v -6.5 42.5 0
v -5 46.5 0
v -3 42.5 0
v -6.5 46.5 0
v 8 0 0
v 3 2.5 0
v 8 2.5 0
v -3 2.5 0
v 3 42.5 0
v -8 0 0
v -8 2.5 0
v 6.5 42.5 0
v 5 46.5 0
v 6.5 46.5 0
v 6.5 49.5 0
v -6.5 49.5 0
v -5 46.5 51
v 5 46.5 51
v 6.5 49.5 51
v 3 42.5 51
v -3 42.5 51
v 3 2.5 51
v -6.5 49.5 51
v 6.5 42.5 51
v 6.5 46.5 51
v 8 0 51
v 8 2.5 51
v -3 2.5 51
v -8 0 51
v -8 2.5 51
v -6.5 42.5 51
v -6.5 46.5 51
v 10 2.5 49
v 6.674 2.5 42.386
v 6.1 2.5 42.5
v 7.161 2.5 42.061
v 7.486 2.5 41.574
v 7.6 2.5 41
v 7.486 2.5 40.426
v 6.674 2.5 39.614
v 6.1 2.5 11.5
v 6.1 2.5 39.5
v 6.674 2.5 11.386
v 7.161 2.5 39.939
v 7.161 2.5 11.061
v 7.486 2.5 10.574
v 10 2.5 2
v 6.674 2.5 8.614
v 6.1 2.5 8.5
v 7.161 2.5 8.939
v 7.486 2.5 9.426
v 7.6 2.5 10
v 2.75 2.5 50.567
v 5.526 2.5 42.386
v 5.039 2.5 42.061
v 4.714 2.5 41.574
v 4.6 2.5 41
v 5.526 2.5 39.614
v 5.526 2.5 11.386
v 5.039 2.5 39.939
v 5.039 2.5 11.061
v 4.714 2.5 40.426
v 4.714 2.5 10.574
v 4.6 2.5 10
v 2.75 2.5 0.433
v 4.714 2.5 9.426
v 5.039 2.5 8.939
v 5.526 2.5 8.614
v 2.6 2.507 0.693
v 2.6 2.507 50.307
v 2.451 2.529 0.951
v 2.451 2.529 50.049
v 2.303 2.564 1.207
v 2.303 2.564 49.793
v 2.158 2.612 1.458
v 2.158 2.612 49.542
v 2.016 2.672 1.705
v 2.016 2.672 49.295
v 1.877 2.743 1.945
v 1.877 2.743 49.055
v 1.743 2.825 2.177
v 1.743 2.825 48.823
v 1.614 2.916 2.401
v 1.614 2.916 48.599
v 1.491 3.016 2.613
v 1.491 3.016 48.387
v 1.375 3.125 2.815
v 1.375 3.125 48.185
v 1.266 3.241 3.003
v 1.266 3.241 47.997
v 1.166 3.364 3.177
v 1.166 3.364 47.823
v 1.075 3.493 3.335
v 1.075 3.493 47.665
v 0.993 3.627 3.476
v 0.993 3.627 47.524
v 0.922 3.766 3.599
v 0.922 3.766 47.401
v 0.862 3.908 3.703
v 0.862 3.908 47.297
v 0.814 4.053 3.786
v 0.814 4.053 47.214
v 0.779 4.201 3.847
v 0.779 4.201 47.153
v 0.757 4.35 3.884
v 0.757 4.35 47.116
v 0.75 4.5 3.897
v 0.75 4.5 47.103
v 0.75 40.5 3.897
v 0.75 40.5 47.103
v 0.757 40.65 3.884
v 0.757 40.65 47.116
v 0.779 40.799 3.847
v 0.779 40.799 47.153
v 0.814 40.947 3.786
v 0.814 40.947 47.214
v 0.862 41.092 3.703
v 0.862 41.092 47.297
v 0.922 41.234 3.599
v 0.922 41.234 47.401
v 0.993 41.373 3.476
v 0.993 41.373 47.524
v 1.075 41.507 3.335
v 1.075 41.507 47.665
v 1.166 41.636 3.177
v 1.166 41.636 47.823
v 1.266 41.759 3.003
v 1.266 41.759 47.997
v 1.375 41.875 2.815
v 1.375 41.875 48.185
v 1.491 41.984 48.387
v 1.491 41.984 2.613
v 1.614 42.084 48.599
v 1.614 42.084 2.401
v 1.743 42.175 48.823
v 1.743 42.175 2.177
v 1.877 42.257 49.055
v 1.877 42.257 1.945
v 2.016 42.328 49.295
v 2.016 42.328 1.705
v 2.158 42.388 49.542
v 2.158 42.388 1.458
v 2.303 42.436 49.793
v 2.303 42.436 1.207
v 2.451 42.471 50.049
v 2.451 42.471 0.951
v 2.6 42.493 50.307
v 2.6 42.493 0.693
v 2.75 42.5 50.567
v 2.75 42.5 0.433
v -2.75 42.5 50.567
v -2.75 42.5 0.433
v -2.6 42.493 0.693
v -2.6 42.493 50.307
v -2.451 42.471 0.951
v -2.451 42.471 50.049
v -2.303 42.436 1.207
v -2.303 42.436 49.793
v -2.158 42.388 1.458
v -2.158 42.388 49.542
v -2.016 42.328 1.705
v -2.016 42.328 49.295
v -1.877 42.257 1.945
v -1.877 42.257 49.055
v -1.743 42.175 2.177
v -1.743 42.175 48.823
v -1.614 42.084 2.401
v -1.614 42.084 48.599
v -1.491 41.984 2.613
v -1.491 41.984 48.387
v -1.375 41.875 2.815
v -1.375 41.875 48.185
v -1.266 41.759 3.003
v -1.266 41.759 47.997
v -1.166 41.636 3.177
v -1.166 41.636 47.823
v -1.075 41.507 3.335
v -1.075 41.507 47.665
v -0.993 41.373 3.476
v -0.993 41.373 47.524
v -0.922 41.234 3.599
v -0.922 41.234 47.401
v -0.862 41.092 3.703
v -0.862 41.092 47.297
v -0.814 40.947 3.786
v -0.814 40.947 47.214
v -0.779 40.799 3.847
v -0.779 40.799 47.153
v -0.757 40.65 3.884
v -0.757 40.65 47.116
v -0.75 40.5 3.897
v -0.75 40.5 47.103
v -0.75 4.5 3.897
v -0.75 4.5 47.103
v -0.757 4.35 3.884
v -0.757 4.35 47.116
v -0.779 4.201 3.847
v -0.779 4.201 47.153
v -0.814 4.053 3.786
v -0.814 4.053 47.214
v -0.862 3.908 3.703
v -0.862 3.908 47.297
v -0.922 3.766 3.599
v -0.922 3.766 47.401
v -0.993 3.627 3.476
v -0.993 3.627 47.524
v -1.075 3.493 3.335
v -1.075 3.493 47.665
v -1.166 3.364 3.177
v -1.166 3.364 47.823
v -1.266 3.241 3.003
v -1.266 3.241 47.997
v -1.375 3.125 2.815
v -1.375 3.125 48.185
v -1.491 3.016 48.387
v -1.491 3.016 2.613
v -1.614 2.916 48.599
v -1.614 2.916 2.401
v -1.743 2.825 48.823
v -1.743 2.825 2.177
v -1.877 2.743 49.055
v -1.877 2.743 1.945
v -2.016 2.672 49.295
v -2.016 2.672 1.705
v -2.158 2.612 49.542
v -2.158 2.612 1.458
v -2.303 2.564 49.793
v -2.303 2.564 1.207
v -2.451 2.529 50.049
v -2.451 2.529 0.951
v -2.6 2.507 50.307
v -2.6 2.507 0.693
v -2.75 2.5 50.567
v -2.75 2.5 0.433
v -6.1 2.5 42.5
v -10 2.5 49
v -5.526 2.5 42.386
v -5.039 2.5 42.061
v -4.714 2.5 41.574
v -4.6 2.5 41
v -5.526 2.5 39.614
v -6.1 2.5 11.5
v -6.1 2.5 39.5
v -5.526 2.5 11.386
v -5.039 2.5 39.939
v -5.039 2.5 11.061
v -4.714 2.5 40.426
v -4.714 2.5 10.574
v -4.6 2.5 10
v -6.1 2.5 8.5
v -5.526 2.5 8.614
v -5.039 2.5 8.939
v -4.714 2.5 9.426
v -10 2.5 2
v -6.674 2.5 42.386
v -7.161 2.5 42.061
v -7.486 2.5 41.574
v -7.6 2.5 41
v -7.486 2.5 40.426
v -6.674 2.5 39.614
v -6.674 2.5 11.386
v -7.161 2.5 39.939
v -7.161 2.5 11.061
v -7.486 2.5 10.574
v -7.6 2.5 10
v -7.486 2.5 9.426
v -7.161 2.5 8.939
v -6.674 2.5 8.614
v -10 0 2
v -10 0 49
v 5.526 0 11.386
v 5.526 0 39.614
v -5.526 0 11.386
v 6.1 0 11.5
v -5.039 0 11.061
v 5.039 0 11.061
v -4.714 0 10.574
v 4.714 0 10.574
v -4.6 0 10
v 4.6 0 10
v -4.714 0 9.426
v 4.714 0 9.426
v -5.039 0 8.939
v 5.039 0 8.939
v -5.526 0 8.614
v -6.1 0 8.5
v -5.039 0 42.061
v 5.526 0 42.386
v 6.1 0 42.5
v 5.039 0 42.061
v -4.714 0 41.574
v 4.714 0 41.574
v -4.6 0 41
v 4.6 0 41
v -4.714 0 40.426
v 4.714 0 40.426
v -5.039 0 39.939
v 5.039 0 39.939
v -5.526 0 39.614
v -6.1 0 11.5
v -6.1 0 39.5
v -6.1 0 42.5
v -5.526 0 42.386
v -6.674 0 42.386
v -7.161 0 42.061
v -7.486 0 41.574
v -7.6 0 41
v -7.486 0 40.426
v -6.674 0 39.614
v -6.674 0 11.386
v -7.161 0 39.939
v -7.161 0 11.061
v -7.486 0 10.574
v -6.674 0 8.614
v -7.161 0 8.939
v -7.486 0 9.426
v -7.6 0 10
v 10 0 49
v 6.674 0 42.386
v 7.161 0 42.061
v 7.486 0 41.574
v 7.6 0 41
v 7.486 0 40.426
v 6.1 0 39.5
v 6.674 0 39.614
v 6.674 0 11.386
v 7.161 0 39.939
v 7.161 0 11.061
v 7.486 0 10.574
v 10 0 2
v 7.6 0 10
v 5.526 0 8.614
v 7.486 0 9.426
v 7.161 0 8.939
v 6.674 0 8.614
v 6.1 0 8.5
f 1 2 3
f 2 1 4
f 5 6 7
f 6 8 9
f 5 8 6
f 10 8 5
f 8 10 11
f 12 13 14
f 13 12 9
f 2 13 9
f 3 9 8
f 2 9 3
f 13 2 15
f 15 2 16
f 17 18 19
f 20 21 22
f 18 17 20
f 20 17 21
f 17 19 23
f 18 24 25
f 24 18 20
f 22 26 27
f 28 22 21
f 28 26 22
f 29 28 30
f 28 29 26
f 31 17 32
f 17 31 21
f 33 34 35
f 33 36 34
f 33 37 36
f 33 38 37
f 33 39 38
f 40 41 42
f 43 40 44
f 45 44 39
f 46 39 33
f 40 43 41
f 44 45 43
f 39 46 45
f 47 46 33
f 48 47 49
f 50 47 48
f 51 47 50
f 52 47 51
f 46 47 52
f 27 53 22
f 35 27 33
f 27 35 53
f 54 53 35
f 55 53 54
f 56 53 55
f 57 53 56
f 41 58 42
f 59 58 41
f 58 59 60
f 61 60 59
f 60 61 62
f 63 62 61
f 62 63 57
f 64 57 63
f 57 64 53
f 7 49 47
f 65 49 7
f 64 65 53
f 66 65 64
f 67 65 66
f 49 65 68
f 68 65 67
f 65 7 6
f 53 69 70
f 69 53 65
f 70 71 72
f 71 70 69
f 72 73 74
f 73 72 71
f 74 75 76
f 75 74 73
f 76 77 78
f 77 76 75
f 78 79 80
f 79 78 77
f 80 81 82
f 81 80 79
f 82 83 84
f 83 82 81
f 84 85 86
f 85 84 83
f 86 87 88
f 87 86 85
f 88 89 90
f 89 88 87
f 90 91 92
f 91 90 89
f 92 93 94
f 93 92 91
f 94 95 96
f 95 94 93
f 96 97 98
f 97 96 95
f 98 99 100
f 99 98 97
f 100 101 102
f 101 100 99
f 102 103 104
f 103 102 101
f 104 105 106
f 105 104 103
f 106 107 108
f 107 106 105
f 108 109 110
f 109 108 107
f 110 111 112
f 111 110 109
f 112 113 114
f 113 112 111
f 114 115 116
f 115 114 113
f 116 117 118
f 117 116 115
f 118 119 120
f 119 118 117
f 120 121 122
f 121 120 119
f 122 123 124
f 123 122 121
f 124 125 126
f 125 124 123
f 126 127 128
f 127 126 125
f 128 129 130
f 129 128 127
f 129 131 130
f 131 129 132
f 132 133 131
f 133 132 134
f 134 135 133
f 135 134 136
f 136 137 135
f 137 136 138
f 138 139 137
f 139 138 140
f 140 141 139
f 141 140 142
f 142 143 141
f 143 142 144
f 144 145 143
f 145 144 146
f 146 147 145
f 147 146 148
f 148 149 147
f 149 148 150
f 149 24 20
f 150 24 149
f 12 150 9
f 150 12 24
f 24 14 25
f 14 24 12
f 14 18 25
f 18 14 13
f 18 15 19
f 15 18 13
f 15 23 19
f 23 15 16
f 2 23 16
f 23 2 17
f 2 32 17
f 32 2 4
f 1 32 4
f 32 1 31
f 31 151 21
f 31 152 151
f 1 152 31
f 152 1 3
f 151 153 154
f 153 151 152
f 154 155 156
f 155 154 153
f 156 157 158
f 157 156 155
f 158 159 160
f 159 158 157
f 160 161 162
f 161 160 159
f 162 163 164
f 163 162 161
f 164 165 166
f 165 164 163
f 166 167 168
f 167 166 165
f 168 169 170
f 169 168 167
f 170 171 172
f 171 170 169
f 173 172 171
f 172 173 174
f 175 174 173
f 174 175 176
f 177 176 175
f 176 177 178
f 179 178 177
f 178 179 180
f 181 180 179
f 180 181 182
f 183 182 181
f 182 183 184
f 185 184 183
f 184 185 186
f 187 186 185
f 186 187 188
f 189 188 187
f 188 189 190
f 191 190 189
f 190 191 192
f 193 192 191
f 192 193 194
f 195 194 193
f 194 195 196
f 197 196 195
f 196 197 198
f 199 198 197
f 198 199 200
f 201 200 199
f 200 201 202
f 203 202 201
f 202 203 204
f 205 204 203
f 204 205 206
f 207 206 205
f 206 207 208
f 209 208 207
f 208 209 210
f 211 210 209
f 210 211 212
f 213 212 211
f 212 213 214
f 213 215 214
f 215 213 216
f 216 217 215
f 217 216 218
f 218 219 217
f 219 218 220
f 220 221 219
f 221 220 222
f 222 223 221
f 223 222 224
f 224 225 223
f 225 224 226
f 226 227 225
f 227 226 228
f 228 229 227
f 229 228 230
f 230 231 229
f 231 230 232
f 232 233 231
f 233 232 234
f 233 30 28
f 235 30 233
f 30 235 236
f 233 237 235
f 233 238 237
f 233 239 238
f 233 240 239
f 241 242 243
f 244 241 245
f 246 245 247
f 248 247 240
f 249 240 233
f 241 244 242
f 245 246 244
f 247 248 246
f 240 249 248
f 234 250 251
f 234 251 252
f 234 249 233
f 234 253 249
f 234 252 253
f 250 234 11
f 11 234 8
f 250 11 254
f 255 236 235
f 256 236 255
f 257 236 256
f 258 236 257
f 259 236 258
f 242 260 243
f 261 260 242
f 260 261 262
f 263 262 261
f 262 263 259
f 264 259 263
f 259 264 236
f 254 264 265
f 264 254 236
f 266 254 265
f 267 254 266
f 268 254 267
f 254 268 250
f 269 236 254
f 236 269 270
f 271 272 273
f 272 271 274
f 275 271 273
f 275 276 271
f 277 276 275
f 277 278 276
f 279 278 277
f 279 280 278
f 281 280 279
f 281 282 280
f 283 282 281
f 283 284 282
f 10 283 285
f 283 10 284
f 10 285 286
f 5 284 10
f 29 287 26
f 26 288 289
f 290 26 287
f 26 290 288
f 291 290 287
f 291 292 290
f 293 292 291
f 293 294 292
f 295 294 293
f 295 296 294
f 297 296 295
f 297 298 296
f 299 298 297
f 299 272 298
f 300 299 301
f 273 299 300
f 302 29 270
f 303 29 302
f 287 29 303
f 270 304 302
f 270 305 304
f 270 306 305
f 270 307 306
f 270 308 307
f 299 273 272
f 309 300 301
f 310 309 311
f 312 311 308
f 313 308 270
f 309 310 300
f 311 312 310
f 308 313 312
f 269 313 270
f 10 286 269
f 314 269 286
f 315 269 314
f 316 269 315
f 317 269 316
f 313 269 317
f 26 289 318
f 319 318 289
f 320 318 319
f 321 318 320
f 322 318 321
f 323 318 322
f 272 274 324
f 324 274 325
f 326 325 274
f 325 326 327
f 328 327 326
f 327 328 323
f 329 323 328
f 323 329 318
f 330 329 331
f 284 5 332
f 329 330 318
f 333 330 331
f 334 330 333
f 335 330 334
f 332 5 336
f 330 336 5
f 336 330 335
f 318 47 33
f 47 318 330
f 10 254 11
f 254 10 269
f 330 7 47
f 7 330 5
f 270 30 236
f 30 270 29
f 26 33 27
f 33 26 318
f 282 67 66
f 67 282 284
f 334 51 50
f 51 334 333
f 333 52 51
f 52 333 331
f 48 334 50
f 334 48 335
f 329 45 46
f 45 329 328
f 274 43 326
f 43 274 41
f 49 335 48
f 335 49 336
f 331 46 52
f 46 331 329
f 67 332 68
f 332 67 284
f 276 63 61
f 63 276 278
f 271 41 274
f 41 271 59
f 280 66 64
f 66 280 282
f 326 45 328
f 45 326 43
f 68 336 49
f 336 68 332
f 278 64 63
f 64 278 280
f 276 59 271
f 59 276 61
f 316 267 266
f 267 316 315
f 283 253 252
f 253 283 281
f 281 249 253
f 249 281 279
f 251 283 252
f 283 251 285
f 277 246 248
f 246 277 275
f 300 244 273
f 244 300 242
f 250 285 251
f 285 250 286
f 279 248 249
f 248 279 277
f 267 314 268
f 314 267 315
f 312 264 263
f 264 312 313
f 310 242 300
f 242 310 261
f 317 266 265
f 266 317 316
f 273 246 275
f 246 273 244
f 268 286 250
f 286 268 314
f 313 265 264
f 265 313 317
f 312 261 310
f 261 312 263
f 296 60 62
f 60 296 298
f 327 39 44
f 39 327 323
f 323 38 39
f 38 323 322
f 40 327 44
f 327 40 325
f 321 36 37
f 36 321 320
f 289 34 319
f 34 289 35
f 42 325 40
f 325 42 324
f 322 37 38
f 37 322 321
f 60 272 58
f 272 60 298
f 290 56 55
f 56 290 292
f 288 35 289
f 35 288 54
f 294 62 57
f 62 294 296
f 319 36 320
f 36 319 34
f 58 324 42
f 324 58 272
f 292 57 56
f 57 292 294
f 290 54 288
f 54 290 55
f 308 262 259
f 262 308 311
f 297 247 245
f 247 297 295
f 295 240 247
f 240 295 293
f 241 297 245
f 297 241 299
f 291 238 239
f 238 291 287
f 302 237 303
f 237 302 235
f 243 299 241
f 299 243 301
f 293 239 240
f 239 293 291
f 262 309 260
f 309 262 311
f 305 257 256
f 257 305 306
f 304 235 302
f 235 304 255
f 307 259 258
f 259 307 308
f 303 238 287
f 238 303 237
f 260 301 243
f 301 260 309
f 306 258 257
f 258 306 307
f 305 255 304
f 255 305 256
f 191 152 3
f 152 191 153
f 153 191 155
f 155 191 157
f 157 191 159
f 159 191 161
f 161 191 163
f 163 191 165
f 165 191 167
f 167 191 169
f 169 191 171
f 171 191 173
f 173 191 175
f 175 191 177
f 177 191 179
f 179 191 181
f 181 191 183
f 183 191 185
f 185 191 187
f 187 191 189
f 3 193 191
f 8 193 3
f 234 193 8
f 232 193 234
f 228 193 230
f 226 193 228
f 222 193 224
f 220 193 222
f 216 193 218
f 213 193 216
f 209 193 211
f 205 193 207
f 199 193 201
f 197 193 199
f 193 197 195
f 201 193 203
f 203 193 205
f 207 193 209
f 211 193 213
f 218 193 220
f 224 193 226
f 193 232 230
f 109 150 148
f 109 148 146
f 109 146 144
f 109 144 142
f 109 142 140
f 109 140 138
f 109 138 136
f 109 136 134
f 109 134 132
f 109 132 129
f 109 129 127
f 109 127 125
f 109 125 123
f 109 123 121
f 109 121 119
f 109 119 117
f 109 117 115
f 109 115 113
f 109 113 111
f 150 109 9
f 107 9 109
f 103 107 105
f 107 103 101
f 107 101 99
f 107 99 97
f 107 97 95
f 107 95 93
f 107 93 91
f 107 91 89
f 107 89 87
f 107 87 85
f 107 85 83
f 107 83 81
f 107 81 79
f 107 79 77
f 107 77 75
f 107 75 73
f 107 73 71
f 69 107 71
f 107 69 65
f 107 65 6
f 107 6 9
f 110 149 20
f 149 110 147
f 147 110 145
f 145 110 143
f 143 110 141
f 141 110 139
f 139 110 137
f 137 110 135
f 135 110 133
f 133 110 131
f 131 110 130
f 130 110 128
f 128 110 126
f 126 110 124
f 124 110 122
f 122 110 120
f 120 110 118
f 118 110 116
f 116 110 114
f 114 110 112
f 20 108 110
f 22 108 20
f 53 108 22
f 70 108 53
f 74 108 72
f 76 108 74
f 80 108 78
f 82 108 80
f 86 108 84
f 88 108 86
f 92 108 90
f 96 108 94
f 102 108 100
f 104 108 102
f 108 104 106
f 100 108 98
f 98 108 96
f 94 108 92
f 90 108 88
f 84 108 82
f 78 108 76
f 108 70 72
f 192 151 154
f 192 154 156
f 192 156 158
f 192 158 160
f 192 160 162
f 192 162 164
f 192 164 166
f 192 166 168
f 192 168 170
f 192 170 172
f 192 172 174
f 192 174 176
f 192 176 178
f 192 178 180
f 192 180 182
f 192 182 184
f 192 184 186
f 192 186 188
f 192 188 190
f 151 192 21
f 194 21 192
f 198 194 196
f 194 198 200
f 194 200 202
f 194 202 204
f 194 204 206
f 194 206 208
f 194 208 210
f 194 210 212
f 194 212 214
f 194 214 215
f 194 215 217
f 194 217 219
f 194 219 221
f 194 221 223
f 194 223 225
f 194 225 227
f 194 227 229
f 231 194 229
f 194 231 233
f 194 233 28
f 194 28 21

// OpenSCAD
use <bezier.scad>;

//<params>
length = 51;
offsetHeight = 40;
holeDiameter = 3;

dovetailWidth = 13;
dovetailHeight = 3;
extraHeight = 4;
baseWidth = 13;
webThickness = 1.5;
mountThickness = 2.5;
mountWidth = 20;
cornerRadius = 2;
triangleSide = 6;
//</params>

module dummy() {}

nudge = 0.01;

module section() {
    curve = [[-mountWidth/2,0], SHARP(), SHARP(), [-mountWidth/2,mountThickness], SHARP(), SYMMETRIC(),
    [-webThickness/2-cornerRadius,mountThickness],
    OFFSET([cornerRadius/2,0]), OFFSET([0,-cornerRadius/2]),
    [-webThickness/2,mountThickness+cornerRadius],SYMMETRIC(),SYMMETRIC(),
    [-webThickness/2,mountThickness+offsetHeight-cornerRadius], OFFSET([0,cornerRadius/2]),
    OFFSET([cornerRadius/2,0]),[-webThickness/2-cornerRadius,mountThickness+offsetHeight], SYMMETRIC(),
    SHARP(), [-baseWidth/2,mountThickness+offsetHeight], SHARP(), SHARP(), 
    [-baseWidth/2,mountThickness+offsetHeight+extraHeight],
    SHARP(), SHARP(),
    [-dovetailWidth/2+dovetailHeight/2,mountThickness+offsetHeight+extraHeight],SHARP(),SHARP(),[-dovetailWidth/2,mountThickness+offsetHeight+extraHeight+dovetailHeight],SHARP(),SHARP(),[0,mountThickness+offsetHeight+extraHeight+dovetailHeight],
    REPEAT_MIRRORED([1,0])
    ];
    
    //BezierVisualize(curve);
    path = Bezier(curve);
    
    //    echo(curve);
//    echo(path);
    polygon(path);
}

extraWidth = dovetailWidth - 2*dovetailHeight;

module webbedMount() {
    render(convexity=2) 
    rotate([90,0,0])
    linear_extrude(height=length) {
        section();
    }
}

module triangleEnd() {
    linear_extrude(height=offsetHeight+mountThickness+nudge)
    polygon([[-triangleSide/2,0], [0,-triangleSide*sqrt(3)/2], [triangleSide/2,0]]);
}

module main() {
    render(convexity=4)
    difference() {
        webbedMount(); 
        translate([-mountWidth/2,0,-nudge]) cylinder(r=cornerRadius,h=mountThickness+2*nudge,$fn=4);
        translate([mountWidth/2,0,-nudge]) cylinder(r=cornerRadius,h=mountThickness+2*nudge,$fn=4);
        translate([-mountWidth/2,-length,-nudge]) cylinder(r=cornerRadius,h=mountThickness+2*nudge,$fn=4);
        translate([mountWidth/2,-length,-nudge]) cylinder(r=cornerRadius,h=mountThickness+2*nudge,$fn=4);
        
    hx = mountWidth/2-1.3*holeDiameter;
    translate([hx,-mountWidth/2,-nudge]) cylinder(d=holeDiameter, h=3*nudge+mountThickness+0.75*offsetHeight, $fn=16);
    translate([-hx,-mountWidth/2,-nudge]) cylinder(d=holeDiameter, h=3*nudge+mountThickness+0.75*offsetHeight, $fn=16);
    translate([hx,-length+mountWidth/2,-nudge]) cylinder(d=holeDiameter, h=3*nudge+mountThickness+0.75*offsetHeight, $fn=16);
    translate([-hx,-length+mountWidth/2,-nudge]) cylinder(d=holeDiameter, h=3*nudge+mountThickness+0.75*offsetHeight, $fn=16);
    }

    triangleEnd();
    translate([0,-length,0]) rotate([0,0,180]) triangleEnd();
}

rotate([-90,0,0]) main();
